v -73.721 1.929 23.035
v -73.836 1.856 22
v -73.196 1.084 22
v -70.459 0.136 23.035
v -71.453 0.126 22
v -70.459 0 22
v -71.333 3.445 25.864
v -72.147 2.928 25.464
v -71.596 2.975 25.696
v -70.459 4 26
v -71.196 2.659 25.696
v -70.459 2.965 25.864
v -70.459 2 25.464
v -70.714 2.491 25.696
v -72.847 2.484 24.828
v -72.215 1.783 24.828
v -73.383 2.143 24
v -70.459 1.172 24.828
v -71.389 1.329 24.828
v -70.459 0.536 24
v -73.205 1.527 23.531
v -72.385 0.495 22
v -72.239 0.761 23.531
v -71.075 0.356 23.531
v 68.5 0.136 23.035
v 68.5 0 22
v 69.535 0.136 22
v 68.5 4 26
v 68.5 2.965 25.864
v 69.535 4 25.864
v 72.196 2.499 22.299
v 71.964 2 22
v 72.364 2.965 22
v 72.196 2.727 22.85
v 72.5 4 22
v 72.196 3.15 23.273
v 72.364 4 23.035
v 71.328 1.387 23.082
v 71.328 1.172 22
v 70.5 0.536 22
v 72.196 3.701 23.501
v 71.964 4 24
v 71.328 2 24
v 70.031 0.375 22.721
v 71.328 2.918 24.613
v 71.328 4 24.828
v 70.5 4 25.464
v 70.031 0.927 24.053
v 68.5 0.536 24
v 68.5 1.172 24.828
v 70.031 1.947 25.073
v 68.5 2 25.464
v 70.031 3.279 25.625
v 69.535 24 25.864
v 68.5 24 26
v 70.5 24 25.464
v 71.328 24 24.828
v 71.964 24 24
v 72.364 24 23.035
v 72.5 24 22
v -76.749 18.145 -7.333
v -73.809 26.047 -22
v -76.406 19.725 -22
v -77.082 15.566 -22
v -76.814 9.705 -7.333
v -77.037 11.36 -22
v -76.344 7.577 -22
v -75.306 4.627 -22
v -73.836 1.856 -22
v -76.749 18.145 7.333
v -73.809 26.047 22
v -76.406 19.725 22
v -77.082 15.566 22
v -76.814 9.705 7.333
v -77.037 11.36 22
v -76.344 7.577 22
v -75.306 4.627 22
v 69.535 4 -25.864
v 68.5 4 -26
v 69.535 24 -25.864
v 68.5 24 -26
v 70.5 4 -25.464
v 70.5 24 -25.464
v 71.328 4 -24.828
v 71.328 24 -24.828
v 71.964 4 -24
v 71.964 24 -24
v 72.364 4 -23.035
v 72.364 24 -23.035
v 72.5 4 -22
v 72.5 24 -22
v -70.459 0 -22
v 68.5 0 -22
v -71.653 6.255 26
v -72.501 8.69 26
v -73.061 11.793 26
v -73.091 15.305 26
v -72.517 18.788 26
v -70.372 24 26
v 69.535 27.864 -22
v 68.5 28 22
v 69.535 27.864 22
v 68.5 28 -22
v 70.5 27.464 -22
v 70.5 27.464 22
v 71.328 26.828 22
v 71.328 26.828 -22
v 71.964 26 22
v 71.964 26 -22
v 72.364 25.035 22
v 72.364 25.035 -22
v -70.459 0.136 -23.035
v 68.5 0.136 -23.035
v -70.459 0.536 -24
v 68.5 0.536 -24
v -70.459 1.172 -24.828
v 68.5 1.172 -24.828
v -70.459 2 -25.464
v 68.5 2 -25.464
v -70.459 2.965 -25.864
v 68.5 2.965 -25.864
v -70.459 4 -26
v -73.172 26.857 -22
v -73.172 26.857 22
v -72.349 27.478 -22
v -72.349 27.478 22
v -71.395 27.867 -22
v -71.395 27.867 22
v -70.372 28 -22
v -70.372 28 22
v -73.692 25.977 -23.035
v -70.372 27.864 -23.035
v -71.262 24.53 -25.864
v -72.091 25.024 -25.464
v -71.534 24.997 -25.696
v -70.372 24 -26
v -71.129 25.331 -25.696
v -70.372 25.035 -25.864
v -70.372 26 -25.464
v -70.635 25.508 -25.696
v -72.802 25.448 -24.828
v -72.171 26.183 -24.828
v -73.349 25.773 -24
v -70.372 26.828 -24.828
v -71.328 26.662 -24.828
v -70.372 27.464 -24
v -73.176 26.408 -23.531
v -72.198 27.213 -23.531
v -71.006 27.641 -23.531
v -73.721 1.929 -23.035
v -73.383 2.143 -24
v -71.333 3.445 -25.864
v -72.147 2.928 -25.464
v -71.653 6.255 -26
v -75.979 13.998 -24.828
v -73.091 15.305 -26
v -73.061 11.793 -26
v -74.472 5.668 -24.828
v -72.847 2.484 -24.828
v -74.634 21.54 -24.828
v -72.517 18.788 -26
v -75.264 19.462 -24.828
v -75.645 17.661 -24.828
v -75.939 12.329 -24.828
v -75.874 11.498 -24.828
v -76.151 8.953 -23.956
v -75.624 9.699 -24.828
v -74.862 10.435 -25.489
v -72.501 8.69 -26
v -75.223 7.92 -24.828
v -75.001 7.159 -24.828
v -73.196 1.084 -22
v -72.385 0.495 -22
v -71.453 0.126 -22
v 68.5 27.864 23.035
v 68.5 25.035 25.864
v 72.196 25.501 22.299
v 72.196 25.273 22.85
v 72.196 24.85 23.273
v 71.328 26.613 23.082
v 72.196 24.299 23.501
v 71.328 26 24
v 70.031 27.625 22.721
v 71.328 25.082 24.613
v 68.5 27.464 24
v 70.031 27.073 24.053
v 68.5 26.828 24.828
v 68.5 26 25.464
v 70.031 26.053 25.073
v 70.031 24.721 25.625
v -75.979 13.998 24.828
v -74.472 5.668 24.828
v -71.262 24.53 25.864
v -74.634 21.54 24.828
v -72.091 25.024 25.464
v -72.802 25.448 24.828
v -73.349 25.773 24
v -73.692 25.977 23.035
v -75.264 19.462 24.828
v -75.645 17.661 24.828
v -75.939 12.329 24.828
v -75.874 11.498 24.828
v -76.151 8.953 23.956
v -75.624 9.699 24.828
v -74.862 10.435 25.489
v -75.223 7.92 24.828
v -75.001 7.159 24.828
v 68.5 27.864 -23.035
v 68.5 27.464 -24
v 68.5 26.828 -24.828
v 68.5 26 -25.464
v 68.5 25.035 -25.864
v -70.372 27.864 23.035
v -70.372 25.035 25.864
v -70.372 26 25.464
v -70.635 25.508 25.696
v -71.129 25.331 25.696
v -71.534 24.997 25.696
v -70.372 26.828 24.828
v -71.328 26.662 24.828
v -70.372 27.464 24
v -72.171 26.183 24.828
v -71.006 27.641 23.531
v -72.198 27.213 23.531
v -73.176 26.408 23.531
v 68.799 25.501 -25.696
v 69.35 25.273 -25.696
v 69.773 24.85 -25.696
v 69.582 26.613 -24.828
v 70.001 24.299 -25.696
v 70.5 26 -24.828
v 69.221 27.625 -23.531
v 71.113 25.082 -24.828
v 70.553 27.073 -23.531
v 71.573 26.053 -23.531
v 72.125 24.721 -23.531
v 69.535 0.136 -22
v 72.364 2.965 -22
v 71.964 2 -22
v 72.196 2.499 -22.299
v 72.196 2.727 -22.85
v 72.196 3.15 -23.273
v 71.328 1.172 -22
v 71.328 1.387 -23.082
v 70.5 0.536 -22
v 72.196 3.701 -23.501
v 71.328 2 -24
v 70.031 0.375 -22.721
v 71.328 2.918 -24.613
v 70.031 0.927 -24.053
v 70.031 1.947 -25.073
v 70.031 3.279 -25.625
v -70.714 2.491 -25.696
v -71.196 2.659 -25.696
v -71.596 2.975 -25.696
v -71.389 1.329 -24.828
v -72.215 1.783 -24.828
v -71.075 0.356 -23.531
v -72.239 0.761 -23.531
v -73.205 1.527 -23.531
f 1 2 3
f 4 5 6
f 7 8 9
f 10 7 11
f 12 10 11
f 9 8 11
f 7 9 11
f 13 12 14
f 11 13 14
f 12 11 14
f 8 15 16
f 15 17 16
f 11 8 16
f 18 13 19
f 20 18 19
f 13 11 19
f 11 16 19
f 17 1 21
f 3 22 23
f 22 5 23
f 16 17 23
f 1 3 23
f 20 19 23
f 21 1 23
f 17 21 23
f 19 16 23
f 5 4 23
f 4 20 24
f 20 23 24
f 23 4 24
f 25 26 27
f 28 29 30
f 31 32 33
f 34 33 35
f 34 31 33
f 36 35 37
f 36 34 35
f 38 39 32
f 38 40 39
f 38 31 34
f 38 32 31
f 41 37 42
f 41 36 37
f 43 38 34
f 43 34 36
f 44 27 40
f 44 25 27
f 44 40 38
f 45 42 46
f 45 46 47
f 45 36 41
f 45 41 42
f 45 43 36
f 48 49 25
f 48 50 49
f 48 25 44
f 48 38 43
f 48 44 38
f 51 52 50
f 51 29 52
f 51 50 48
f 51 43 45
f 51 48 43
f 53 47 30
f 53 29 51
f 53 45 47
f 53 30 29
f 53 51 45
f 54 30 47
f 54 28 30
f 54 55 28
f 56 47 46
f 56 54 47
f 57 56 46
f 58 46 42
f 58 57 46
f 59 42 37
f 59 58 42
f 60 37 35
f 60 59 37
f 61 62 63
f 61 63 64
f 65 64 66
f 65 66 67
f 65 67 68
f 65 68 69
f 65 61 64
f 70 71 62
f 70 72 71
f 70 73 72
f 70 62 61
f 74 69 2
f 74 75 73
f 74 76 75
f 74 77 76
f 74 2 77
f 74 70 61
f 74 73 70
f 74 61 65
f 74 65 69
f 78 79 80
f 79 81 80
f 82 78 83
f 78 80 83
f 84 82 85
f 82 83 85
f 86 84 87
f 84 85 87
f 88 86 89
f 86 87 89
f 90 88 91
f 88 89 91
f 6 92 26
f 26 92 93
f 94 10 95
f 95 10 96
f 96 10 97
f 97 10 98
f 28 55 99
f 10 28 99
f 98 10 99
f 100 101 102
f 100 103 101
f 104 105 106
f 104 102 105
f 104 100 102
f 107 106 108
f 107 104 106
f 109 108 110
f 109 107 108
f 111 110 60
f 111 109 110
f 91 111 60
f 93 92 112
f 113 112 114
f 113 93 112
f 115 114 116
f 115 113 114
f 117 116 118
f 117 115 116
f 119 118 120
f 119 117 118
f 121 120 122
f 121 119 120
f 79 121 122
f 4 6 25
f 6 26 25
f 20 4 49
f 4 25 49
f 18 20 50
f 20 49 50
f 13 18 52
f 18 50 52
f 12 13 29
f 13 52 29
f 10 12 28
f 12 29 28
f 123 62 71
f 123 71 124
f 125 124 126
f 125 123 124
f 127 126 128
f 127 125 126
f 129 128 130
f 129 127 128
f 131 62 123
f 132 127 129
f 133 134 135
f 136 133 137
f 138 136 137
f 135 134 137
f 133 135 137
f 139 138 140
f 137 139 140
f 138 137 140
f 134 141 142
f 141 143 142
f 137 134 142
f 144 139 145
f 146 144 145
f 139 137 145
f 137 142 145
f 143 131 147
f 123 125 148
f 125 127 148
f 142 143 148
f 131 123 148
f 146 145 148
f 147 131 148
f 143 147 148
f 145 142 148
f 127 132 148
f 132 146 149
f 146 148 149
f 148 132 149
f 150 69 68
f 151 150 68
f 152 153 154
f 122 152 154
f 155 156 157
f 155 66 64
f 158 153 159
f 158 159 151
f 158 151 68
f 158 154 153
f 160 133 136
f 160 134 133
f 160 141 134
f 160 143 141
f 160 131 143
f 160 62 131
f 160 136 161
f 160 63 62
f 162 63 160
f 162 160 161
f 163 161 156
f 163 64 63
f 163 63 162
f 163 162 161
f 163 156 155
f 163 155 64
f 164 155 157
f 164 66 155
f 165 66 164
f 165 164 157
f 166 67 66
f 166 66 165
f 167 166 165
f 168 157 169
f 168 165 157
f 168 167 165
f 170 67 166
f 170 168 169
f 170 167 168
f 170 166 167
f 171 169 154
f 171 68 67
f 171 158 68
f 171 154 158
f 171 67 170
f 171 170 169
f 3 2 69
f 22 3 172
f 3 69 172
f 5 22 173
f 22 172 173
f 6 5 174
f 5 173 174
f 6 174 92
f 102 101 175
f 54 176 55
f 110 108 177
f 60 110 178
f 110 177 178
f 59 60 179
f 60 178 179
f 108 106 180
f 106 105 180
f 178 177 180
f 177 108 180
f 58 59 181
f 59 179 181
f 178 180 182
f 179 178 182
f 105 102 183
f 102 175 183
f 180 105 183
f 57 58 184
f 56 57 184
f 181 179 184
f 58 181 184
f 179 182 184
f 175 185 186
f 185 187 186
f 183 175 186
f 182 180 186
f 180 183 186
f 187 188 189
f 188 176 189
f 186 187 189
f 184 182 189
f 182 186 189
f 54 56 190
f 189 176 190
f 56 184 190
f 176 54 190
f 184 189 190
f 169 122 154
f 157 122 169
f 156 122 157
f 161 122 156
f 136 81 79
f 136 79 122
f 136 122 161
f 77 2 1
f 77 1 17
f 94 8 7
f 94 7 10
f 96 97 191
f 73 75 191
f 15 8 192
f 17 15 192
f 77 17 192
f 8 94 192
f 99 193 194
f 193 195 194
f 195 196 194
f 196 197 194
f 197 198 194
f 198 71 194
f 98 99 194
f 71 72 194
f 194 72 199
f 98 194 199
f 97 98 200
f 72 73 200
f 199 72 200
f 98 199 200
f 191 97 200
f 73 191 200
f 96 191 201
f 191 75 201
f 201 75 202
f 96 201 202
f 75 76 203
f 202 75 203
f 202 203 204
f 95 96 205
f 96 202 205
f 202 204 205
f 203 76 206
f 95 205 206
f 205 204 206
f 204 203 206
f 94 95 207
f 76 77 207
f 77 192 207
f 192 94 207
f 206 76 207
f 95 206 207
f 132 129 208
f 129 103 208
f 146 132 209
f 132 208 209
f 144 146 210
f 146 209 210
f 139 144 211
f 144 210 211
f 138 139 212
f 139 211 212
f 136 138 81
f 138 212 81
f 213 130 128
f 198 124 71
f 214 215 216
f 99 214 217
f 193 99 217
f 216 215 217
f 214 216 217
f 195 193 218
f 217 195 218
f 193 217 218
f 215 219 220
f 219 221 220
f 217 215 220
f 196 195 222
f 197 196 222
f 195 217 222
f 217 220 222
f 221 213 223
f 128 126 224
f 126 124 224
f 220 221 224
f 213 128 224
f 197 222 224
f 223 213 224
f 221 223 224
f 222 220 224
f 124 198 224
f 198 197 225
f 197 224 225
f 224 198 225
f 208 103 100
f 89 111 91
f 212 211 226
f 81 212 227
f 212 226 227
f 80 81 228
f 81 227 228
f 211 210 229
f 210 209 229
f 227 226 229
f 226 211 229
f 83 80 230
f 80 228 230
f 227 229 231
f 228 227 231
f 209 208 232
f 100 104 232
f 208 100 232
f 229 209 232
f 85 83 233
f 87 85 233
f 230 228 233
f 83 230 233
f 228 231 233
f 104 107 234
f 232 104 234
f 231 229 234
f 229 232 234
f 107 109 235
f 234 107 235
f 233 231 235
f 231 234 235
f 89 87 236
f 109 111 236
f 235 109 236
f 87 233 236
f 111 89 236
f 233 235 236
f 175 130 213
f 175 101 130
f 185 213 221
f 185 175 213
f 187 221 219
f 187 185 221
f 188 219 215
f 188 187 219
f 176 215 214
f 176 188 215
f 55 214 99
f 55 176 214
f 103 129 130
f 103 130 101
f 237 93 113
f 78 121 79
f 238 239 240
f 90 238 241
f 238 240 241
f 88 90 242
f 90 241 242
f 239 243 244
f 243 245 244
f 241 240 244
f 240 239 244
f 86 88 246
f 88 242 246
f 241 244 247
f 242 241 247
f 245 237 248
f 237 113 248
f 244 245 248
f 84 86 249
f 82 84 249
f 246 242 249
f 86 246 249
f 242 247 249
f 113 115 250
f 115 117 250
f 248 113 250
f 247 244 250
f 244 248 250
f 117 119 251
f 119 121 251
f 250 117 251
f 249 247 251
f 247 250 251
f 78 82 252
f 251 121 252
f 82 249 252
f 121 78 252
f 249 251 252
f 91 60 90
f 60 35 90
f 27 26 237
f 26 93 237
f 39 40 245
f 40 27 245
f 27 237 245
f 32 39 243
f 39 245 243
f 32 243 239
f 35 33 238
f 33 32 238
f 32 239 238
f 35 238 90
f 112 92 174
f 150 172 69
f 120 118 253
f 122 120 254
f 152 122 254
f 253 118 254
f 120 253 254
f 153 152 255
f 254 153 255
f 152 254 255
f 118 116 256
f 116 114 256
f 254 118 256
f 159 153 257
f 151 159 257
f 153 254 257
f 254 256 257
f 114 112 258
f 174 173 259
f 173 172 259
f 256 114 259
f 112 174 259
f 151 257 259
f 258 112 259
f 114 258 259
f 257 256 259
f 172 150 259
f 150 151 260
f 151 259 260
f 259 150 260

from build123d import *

# Parameters (mm, degrees)
SKETCH1_W           = 145
SKETCH1_H           = 52
BOSS_EXTRUDE1_DEPTH = 28
BOSS_EXTRUDE2_DEPTH = 52
FILLET1_R           = 4


with BuildPart() as part:
    # Sketch1 → Boss-Extrude1 (new body)
    with BuildSketch(Plane(origin=(0, 0, 0), x_dir=(1, 0, 0), z_dir=(0, 1, 0))):
        Rectangle(SKETCH1_W, SKETCH1_H)
    extrude(amount=BOSS_EXTRUDE1_DEPTH)

    # Sketch2 → Boss-Extrude2 (add)
    with BuildSketch(Plane.XY.offset(26)):
        with BuildLine():
            Line((-72.5, 28), (-72.5, 0))
            add(Edge.make_bspline(
                [(-72.5, 28), (-78.493180673, 20.025672692), (-78.910368837, 7.889631717), (-72.5, 0)],
                knots=[0, 0, 0, 0, 1, 1, 1, 1], degree=3))
        make_face()
    extrude(amount=-BOSS_EXTRUDE2_DEPTH)

    # Fillet1
    fillet1_edges = [part.edges().sort_by_distance(p)[0] for p in [
        (-72.5, 28, 0),
        (0, 28, 26),
        (-77.151285846, 13.972552869, -26),
        (-77.151285846, 13.972552869, 26),
        (72.5, 28, 0),
        (0, 0, 26),
        (-72.5, 0, 0),
        (0, 0, -26),
        (72.5, 0, 0),
        (0, 28, -26),
        (72.5, 14, 26),
        (72.5, 14, -26),
    ]]
    fillet(fillet1_edges, radius=FILLET1_R)


solid = part.part
